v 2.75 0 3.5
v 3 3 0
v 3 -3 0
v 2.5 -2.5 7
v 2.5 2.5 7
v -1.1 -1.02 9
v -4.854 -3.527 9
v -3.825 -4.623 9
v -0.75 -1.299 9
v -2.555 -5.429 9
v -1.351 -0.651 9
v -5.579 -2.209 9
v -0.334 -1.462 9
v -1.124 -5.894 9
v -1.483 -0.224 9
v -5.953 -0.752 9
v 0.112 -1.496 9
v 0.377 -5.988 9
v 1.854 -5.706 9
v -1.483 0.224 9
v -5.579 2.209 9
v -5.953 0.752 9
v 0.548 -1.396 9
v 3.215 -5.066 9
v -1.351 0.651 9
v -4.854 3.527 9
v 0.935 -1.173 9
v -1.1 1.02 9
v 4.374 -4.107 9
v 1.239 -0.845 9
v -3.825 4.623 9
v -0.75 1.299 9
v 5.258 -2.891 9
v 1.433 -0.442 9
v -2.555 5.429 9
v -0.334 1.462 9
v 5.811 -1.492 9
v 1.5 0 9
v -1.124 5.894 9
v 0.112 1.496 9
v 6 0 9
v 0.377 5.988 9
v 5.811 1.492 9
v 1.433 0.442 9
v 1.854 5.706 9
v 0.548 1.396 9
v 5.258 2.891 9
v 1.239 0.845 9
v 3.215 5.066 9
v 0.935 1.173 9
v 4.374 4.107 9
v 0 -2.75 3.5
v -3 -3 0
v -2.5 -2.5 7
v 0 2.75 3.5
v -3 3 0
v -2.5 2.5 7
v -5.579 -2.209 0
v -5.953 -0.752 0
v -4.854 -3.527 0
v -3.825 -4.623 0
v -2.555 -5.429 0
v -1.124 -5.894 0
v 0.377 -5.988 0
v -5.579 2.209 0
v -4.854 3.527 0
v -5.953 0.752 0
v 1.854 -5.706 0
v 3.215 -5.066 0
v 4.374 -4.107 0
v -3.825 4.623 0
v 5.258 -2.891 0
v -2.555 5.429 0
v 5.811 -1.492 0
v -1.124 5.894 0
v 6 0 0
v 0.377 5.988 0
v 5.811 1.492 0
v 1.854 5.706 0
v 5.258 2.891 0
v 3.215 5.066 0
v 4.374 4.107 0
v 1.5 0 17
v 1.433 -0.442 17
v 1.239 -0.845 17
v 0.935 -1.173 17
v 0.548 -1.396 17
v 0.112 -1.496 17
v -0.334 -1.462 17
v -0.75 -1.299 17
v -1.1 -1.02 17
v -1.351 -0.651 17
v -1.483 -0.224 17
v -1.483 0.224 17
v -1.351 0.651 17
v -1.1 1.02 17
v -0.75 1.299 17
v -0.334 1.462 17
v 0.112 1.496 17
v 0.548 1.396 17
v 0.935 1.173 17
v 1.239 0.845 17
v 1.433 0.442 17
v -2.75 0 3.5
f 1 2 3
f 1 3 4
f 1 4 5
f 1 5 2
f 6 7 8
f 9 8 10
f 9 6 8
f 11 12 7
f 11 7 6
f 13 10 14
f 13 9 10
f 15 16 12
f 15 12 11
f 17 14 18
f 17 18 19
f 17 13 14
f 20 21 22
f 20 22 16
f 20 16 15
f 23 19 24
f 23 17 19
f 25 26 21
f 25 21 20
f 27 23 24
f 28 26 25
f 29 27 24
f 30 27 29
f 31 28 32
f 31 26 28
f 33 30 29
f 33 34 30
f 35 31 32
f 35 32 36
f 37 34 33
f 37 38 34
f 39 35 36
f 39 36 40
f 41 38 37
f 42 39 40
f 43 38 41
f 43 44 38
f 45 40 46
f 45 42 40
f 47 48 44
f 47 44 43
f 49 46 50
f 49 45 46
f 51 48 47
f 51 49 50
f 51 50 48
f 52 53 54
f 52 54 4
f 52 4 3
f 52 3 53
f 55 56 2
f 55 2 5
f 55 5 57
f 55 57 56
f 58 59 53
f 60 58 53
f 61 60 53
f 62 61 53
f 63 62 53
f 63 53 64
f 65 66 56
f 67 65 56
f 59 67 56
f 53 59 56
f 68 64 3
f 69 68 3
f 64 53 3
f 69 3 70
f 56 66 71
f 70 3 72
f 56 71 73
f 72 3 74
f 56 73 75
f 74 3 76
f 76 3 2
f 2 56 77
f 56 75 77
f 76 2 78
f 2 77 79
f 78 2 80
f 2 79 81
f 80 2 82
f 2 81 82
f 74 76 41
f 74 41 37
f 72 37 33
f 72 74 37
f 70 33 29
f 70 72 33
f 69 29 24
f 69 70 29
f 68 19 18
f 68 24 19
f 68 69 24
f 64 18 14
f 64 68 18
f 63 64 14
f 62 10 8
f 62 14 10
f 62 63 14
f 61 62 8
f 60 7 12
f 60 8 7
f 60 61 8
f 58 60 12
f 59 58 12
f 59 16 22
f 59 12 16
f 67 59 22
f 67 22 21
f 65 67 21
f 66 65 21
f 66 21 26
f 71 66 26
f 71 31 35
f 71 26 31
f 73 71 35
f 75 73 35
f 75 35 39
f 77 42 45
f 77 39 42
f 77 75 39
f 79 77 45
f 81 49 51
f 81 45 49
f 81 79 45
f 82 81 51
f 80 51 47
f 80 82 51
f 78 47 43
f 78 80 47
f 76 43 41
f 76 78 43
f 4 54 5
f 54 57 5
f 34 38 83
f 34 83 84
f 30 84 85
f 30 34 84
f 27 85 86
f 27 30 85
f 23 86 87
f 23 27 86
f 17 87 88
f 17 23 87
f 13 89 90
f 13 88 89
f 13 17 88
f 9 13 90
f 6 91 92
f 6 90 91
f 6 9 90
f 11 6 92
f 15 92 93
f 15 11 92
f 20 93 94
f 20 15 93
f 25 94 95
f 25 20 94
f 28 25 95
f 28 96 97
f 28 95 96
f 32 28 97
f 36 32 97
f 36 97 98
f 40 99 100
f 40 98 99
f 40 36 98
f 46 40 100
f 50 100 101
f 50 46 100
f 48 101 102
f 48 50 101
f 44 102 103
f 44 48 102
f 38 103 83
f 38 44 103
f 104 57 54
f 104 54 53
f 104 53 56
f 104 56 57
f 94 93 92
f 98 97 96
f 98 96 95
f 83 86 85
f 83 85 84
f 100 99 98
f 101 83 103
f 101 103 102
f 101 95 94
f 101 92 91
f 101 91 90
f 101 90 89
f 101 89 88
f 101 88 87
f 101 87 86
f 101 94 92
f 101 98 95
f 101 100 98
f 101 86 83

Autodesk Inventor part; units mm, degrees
ref_plane "YZ Plane" through (0, 0, 0) normal (1, 0, 0) x (0, 1, 0)
ref_plane "XZ Plane" through (0, 0, 0) normal (0, 1, 0) x (-1, 0, 0)
ref_plane "XY Plane" through (0, 0, 0) normal (0, 0, 1) x (1, 0, 0)
sketch "Sketch8" plane through (0, 0, 0) normal (0, 0, 1) x (1, 0, 0)
  circle A0 centre (0, 0) radius 6
  dimension "d35" = 12
extrude "Extrusion4" add sketch "Sketch8" along normal blind 7
sketch "Sketch9" plane through (0, 0, 7) normal (0, 0, 1) x (1, 0, 0)
  line L0 (-2.5, 2.5) -> (2.5, 2.5)
  line L1 (2.5, 2.5) -> (2.5, -2.5)
  line L2 (2.5, -2.5) -> (-2.5, -2.5)
  line L3 (-2.5, -2.5) -> (-2.5, 2.5)
  point P0 (0, 0)
  point P1 (0, 0)
  dimension "d38" = 5
  dimension "d39" = 5
  dimension "d40" = 2.5
  dimension "d41" = 2.5
sketch "Sketch10" plane through (0, 0, 0) normal (0, 0, -1) x (-1, 0, 0)
  line L0 (-3, 3) -> (3, 3)
  line L1 (3, 3) -> (3, -3)
  line L2 (3, -3) -> (-3, -3)
  line L3 (-3, -3) -> (-3, 3)
  point P0 (0, 0)
  dimension "d42" = 6
  dimension "d43" = 6
  dimension "d44" = 3
  dimension "d45" = 3
loft "Loft3" cut profiles "Sketch9", "Sketch10"
sketch "Sketch11" plane through (0, 0, 7) normal (0, 0, 1) x (1, 0, 0)
  circle A0 centre (0, 0) radius 6
extrude "Extrusion5" add sketch "Sketch11" along normal blind 2
sketch "Sketch12" plane through (0, 0, 9) normal (0, 0, 1) x (1, 0, 0)
  circle A0 centre (0, 0) radius 1.5
  dimension "d52" = 3
extrude "Extrusion6" add sketch "Sketch12" along normal blind 8
properties part number "Input Connection"
